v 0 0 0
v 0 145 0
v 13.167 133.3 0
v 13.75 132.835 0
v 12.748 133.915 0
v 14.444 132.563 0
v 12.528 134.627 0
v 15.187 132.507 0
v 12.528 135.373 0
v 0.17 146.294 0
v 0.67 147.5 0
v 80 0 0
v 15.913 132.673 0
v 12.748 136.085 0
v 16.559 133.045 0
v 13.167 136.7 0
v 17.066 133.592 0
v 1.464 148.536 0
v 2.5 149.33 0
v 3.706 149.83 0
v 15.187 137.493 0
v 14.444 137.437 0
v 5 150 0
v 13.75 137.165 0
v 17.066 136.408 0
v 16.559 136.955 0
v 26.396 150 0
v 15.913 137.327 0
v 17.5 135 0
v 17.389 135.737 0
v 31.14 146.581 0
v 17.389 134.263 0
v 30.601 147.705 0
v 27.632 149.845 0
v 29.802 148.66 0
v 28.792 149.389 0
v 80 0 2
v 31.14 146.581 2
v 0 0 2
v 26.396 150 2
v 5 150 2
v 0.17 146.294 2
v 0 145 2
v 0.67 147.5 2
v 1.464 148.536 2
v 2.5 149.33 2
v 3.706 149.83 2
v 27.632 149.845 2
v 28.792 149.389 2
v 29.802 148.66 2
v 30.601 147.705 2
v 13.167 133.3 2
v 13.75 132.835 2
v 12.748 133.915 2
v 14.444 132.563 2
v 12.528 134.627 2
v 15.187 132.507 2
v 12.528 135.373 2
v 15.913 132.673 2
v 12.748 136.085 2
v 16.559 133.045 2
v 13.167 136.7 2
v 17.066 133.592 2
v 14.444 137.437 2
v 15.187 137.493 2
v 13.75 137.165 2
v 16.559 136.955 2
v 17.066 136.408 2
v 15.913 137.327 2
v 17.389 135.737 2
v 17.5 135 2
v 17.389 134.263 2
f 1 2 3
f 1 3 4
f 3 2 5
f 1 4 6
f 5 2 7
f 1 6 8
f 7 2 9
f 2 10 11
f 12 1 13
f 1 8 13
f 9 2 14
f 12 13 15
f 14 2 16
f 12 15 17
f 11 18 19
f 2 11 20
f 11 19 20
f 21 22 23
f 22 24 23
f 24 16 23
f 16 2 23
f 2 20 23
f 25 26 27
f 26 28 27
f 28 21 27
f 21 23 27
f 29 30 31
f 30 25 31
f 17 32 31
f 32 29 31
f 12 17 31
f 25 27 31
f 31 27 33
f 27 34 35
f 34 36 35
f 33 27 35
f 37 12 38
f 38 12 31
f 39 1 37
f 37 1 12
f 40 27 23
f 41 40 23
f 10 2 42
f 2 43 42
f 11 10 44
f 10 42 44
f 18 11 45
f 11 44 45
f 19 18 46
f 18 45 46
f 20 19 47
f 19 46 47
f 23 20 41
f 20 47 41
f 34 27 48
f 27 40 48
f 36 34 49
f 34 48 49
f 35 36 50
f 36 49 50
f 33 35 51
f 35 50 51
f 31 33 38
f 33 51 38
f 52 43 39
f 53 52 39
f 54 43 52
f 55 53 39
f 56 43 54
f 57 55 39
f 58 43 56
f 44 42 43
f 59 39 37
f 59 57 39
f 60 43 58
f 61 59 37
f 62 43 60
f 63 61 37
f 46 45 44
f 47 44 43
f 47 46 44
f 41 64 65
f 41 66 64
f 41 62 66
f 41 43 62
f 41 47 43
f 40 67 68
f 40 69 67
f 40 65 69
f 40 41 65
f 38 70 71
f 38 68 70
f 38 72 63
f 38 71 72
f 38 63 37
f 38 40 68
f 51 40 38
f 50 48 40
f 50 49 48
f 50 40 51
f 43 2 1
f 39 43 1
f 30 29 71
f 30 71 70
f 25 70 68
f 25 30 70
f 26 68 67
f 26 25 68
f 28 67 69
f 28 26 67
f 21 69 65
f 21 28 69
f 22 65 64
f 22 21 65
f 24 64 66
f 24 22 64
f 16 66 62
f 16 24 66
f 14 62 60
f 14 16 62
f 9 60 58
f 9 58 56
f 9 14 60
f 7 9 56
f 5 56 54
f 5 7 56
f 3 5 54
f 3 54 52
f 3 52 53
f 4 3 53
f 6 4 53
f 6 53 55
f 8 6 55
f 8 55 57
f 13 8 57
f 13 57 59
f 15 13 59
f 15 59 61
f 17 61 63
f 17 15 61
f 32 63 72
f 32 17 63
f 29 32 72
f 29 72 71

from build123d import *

# Parameters (mm, degrees)
F0_R     = 2.5
F1_DEPTH = 2
F2_R     = 5


with BuildPart() as f1:
    # F0 (on Top) → F1 (new body)
    with BuildSketch(Plane.XY):
        Polygon((0, 150), (0, 0), (80, 0), (30, 150), align=None)
        with Locations((15, 135)):
            Circle(F0_R, mode=Mode.SUBTRACT)
    extrude(amount=F1_DEPTH)

    # F2
    f2_edges = [f1.edges().sort_by_distance(p)[0] for p in [
        (0, 150, 1),
        (30, 150, 1),
    ]]
    fillet(f2_edges, radius=F2_R)


solid = f1.part
